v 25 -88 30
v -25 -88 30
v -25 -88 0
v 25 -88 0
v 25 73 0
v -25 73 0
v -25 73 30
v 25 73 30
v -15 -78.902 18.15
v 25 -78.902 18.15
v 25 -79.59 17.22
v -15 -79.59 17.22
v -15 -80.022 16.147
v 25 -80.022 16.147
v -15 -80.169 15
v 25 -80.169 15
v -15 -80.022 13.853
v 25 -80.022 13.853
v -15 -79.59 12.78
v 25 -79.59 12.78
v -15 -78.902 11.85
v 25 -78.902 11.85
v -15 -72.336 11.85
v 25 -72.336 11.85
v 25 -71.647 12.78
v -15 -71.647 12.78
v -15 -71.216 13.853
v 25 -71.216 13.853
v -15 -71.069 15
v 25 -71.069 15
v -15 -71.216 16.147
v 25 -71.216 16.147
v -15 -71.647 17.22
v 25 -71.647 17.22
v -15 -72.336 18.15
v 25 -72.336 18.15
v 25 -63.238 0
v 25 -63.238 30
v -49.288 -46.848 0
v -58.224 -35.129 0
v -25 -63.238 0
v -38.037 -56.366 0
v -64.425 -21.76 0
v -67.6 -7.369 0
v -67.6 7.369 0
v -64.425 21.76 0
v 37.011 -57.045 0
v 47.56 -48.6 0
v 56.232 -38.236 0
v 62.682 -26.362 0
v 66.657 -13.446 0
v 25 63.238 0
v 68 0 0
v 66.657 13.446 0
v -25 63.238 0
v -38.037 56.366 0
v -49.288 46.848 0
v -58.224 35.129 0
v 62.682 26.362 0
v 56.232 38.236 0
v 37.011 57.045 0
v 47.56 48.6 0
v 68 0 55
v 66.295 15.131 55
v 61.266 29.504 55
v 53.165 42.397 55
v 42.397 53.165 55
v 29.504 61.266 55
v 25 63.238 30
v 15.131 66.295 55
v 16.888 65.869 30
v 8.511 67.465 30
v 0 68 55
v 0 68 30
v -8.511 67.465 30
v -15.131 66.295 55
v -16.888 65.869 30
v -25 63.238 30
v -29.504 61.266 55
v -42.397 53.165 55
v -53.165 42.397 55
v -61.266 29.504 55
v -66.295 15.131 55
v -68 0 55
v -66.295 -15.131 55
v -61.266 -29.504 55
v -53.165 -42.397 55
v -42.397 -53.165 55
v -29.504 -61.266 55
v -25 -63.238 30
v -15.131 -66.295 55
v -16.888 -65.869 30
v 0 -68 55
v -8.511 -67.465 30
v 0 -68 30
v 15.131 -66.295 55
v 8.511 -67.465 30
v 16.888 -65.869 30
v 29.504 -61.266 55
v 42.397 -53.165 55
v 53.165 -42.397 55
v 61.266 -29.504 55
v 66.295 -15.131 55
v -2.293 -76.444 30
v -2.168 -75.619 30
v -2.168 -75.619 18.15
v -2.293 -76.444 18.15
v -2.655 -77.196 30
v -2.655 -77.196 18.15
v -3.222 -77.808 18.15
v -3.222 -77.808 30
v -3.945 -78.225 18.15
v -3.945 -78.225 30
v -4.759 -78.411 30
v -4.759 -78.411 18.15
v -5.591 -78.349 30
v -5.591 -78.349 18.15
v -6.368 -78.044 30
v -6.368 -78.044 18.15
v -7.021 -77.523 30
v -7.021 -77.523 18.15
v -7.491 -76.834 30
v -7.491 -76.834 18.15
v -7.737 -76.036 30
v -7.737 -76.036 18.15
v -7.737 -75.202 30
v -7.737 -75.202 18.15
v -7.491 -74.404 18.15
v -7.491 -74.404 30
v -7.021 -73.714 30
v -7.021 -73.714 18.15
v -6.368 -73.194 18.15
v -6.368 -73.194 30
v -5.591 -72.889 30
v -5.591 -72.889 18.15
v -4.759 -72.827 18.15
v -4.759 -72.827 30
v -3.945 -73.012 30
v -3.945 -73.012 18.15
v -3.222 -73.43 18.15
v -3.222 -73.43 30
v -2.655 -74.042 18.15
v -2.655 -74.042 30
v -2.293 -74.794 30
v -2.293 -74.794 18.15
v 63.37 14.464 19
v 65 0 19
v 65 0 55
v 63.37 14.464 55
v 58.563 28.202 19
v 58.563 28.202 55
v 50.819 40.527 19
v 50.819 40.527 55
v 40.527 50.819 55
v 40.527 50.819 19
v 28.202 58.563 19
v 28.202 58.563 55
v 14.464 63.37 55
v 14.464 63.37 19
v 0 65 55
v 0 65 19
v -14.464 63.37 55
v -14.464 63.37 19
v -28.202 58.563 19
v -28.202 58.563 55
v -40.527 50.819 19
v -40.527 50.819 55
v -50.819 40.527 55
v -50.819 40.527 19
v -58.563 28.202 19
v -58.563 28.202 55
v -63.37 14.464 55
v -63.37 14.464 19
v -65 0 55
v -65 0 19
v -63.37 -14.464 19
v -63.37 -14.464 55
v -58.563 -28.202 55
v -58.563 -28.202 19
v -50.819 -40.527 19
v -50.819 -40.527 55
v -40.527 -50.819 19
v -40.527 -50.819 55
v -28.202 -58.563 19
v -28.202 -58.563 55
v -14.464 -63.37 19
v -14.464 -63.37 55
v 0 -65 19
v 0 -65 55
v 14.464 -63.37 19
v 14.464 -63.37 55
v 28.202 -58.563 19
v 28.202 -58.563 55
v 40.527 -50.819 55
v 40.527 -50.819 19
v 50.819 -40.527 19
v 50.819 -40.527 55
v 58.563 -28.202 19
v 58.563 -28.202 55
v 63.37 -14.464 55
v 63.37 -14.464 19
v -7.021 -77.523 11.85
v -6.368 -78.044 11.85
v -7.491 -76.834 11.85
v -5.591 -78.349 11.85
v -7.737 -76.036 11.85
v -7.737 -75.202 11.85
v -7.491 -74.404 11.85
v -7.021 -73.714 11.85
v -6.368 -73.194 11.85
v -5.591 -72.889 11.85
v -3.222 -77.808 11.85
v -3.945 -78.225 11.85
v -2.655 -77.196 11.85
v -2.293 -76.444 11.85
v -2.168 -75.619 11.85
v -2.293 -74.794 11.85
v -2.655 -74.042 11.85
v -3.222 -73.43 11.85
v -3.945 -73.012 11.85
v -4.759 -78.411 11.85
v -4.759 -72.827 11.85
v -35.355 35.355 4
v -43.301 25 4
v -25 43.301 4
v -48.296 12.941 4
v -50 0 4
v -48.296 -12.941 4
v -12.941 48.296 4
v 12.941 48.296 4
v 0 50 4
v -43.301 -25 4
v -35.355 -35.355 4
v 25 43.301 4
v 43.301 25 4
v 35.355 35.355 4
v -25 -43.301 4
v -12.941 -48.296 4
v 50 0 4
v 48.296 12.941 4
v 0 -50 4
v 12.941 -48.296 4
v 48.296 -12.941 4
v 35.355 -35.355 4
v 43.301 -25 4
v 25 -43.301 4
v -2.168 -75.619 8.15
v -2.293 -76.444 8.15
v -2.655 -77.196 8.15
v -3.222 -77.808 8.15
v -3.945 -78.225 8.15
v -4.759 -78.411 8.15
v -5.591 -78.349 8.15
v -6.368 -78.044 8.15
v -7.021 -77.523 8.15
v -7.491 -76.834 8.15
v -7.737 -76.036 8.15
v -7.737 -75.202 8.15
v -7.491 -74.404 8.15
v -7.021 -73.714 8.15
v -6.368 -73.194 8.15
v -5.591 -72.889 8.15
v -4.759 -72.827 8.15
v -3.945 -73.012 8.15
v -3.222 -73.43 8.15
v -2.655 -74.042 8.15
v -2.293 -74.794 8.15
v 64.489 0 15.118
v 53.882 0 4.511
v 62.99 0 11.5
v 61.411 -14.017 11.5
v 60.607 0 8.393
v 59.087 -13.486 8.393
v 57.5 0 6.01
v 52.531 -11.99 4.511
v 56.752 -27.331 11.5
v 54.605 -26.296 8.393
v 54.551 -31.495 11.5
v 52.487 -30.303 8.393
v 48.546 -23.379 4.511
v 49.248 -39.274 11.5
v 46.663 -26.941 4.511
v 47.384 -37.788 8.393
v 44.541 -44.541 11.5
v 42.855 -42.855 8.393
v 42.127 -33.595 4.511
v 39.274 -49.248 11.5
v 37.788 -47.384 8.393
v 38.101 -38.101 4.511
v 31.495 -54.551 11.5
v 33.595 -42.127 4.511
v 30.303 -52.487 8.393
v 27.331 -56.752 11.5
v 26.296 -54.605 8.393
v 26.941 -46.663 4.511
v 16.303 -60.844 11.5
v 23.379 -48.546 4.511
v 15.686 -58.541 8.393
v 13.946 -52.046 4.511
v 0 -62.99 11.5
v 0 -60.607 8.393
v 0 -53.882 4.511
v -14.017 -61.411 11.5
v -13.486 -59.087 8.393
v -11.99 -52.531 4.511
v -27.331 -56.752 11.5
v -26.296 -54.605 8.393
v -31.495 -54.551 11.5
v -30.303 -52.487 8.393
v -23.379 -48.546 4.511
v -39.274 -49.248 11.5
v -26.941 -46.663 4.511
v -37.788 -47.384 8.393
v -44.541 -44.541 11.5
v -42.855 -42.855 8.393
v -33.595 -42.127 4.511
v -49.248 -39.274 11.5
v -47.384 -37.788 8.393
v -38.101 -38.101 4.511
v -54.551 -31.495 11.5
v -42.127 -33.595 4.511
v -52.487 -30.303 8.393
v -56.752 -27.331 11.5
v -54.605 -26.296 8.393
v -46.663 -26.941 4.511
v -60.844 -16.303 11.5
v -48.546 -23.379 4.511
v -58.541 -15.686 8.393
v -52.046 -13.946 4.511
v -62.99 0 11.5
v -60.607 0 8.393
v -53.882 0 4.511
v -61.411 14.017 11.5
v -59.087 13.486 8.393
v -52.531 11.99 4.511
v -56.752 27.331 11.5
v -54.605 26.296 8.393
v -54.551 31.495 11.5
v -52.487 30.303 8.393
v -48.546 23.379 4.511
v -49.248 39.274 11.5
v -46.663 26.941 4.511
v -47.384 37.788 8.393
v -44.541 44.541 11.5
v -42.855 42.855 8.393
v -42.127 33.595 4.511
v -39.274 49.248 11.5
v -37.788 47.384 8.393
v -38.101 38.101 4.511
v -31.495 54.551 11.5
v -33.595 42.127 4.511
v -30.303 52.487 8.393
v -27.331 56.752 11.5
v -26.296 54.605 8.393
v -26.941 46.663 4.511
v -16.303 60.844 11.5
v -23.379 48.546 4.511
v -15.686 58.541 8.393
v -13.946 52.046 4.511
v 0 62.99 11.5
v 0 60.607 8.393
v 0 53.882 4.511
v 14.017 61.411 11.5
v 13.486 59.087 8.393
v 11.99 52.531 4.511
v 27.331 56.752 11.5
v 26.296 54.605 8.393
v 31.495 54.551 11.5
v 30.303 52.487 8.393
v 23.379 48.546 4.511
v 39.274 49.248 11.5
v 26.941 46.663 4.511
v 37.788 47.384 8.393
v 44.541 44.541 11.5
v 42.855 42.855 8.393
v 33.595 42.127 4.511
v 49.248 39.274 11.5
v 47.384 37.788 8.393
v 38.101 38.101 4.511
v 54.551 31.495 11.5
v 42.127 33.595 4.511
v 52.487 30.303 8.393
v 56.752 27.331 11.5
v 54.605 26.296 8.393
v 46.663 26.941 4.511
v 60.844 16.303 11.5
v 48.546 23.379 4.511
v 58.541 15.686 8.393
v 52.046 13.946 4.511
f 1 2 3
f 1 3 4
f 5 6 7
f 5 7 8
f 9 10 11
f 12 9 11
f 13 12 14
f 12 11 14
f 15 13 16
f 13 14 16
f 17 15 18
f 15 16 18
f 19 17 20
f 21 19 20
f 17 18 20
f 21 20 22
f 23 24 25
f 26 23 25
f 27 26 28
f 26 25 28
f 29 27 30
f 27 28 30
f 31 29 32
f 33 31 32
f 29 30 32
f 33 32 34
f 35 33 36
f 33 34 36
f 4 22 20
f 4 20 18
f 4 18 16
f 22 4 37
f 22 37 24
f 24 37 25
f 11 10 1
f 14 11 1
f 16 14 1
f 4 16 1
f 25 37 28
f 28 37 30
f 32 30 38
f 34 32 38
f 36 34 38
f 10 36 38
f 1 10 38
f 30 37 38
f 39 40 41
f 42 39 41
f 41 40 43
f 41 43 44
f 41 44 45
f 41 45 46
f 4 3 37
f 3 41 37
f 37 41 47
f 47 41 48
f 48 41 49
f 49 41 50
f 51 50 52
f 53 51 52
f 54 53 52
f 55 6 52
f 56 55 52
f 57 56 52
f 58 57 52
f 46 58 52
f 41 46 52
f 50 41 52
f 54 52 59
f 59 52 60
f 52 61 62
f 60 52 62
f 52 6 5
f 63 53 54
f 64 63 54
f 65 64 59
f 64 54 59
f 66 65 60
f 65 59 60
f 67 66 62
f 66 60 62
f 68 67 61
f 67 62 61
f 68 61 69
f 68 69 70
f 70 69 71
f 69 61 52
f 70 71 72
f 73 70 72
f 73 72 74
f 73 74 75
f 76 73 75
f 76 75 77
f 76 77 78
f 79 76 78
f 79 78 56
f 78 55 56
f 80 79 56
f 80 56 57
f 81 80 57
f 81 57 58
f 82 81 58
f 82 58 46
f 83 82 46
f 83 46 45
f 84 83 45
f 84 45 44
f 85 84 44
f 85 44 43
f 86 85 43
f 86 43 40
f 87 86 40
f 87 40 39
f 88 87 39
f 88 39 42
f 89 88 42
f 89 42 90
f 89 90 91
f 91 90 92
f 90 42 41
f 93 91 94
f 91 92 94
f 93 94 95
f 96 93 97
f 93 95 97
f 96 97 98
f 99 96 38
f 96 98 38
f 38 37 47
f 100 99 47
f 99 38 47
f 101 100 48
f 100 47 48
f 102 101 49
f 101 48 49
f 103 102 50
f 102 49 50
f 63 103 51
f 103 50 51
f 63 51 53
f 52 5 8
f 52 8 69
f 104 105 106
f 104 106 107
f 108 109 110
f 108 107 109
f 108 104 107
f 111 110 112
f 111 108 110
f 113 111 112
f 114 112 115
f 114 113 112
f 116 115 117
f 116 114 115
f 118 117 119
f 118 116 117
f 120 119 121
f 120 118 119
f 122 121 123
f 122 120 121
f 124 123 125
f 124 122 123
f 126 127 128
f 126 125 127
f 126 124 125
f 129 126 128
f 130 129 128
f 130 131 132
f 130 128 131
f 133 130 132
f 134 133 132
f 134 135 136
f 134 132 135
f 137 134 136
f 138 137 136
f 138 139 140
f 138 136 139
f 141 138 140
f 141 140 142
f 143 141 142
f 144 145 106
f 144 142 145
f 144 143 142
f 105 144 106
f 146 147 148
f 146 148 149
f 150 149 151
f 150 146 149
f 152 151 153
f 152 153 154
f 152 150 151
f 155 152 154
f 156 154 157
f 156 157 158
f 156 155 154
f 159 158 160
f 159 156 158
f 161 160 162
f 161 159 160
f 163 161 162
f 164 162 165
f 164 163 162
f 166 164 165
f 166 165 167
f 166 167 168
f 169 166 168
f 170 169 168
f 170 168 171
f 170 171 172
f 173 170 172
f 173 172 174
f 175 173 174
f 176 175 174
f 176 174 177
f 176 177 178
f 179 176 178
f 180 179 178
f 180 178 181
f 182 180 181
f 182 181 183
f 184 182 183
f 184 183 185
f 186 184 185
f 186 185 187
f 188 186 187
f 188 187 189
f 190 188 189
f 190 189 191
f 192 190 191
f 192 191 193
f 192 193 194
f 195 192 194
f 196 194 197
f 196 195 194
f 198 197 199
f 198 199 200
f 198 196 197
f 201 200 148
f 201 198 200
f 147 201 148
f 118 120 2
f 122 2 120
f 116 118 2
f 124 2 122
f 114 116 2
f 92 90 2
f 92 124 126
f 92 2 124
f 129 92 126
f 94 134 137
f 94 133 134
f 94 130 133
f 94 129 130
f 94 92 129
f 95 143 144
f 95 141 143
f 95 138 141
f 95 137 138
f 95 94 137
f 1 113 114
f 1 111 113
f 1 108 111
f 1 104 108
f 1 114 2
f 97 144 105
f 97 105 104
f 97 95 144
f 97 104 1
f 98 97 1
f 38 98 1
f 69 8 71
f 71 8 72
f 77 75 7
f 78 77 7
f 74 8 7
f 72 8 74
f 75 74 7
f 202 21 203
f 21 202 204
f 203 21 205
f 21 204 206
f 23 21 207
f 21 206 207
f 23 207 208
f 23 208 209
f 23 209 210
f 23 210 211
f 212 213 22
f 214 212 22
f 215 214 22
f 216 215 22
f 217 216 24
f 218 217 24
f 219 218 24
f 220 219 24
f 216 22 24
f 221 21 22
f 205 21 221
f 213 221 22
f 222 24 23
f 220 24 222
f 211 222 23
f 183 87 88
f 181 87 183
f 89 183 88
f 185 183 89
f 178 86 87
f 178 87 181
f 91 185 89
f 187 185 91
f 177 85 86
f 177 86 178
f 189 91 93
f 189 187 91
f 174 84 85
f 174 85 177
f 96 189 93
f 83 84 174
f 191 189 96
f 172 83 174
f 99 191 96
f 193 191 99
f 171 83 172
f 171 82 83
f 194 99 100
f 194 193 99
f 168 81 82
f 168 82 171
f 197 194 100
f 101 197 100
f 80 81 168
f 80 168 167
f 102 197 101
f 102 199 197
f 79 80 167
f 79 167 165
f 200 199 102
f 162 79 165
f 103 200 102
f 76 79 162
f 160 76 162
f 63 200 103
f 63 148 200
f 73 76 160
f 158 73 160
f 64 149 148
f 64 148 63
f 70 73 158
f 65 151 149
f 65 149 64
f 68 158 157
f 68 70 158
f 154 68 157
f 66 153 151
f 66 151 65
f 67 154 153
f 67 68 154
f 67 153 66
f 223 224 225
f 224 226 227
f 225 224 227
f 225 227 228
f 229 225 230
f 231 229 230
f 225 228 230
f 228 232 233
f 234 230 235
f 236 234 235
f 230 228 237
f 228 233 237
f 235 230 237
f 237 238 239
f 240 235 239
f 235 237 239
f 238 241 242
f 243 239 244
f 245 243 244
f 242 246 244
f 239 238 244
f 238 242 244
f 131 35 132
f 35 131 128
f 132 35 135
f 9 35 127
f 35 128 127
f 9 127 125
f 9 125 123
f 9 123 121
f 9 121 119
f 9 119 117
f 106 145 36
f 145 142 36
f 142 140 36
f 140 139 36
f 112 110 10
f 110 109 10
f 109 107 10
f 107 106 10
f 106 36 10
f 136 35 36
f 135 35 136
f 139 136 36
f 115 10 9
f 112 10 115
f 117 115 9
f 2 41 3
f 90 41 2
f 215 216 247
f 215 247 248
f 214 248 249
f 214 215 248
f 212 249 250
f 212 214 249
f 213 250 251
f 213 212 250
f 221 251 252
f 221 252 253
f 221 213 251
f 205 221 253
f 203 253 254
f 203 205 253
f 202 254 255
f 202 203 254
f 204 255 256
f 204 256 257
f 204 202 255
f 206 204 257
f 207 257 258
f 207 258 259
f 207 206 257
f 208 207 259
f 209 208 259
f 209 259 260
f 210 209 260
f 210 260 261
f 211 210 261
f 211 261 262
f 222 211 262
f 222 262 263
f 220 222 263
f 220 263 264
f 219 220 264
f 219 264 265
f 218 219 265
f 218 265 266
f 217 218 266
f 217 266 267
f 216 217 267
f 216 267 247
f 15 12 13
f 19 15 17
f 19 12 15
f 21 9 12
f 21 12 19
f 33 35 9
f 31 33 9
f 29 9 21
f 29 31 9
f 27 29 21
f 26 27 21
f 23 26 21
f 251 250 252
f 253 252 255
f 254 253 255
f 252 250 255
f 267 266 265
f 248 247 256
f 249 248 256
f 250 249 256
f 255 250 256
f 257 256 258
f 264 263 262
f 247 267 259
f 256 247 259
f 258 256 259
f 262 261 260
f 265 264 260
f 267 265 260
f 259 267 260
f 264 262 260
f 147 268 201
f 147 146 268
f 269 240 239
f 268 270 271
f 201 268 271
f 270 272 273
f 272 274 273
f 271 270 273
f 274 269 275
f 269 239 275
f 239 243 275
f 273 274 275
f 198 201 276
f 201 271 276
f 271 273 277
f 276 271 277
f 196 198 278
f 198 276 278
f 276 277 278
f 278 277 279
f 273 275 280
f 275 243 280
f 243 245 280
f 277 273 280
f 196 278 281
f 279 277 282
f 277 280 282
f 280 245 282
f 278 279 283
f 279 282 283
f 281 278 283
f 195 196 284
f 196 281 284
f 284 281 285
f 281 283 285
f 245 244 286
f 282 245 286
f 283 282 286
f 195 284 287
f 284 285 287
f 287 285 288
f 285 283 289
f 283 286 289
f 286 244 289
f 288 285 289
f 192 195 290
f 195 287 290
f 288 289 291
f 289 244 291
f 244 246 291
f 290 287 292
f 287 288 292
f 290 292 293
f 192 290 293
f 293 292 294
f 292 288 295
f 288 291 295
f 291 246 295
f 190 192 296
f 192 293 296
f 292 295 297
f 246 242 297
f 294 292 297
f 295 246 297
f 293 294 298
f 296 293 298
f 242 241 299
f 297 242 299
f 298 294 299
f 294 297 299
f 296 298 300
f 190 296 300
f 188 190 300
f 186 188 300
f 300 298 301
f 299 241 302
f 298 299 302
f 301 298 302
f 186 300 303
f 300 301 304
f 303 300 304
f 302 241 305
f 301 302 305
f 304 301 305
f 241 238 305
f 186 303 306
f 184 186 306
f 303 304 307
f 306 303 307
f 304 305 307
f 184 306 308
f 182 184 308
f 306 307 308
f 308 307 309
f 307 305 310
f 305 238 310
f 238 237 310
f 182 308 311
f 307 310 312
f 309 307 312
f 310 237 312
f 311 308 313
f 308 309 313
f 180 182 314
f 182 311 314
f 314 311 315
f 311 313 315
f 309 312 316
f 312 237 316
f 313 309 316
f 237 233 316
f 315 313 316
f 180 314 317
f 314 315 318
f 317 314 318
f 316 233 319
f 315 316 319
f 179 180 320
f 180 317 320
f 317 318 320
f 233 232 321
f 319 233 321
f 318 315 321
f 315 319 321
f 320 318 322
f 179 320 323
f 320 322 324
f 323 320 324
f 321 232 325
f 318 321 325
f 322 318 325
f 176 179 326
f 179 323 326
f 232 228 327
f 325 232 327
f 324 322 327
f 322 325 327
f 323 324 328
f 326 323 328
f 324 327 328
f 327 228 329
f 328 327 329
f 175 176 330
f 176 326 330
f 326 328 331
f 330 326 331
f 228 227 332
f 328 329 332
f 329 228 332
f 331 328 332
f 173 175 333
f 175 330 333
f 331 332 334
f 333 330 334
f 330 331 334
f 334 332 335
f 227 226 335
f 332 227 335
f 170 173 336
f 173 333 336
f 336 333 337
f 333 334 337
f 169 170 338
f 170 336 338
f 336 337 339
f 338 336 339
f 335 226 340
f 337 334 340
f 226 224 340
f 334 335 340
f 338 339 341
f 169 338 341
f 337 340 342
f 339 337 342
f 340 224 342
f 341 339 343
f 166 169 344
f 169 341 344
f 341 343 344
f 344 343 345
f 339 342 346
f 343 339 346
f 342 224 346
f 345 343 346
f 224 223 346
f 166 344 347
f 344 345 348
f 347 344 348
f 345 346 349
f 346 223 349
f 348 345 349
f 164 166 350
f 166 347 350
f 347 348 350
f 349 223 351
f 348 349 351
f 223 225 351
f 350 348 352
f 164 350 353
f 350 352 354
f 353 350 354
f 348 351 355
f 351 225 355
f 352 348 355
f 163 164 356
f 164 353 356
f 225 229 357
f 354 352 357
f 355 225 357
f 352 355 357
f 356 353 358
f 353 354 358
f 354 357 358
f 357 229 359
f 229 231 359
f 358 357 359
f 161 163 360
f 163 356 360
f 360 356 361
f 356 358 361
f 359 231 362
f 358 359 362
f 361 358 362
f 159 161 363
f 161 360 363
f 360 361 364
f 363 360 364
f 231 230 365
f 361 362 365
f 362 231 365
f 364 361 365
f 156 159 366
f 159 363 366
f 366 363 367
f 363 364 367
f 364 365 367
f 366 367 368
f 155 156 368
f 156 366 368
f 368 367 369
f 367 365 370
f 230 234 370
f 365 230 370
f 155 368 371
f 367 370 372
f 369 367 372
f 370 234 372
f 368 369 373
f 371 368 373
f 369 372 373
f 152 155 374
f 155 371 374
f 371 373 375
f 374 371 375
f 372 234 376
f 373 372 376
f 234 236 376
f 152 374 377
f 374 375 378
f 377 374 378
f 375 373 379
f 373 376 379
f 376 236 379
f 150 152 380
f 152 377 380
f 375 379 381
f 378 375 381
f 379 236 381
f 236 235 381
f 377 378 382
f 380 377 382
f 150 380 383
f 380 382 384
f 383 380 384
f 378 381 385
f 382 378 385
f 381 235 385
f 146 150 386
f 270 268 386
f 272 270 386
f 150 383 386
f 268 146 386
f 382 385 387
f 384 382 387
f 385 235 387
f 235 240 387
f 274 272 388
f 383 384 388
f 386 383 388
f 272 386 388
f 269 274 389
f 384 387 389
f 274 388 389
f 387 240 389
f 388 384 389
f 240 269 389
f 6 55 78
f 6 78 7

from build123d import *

# Parameters (mm, degrees)
SKETCH_1_R               = 68
SKETCH_1_R_2             = 65
EXTRUDE_1_DEPTH          = 55
SKETCH_2_R               = 68
EXTRUDE_1_2_DEPTH        = 4
FILLET_1_R               = 15
EXTRUDE_2_DEPTH          = 30
SKETCH_4_W               = 50
SKETCH_4_H               = 30
EXTRUDE_3_DEPTH          = 15
CUT_EXTRUDE_1_DEPTH      = 40
CUT_EXTRUDE_2_DEPTH      = 10
CUT_EXTRUDE_2_DEPTH_BACK = 20


with BuildPart() as part:
    # 草图1 → Extrude 1 (new body)
    with BuildSketch(Plane.XY):
        Circle(SKETCH_1_R)
        Circle(SKETCH_1_R_2, mode=Mode.SUBTRACT)
    extrude(amount=EXTRUDE_1_DEPTH)

    # 草图2 → Extrude 1 2 (add)
    with BuildSketch(Plane(origin=(0, 0, 0), x_dir=(-1, 0, 0), z_dir=(0, 0, -1))):
        with Locations(Location((0, 0, 0), (0, 0, 180))):
            Circle(SKETCH_2_R)
    extrude(amount=-EXTRUDE_1_2_DEPTH)

    # 圆角1
    fillet_1_edges = [part.edges().sort_by_distance(p)[0] for p in [
        (-65, 0, 4),
    ]]
    fillet(fillet_1_edges, radius=FILLET_1_R)

    # 草图3 → 凸台-拉伸2 (add)
    with BuildSketch(Plane(origin=(0, 0, 0), x_dir=(-1, 0, 0), z_dir=(0, 0, -1))):
        with BuildLine():
            Line((25, -73), (25, -63.237647015))
            ThreePointArc((25, -63.237647015), (12.724779035, -66.798802373), (0, -68))
            ThreePointArc((0, -68), (-12.724779035, -66.798802373), (-25, -63.237647015))
            Line((-25, -63.237647015), (-25, -73))
            Line((-25, -73), (25, -73))
        make_face()
        with BuildLine():
            ThreePointArc((-25, 63.237647015), (-12.724779035, 66.798802373), (0, 68))
            ThreePointArc((0, 68), (12.724779035, 66.798802373), (25, 63.237647015))
            Line((25, 63.237647015), (25, 73))
            Line((25, 73), (-25, 73))
            Line((-25, 73), (-25, 63.237647015))
        make_face()
    extrude(amount=-EXTRUDE_2_DEPTH)

    # 草图4 → 凸台-拉伸3 (add)
    with BuildSketch(Plane.XZ.offset(73)):
        with Locations((0, 15)):
            Rectangle(SKETCH_4_W, SKETCH_4_H)
    extrude(amount=EXTRUDE_3_DEPTH)

    # 草图5 → 切除-拉伸1 (cut)
    with BuildSketch(Plane(origin=(25, 0, 0), x_dir=(0, 0, -1), z_dir=(1, 0, 0))):
        with BuildLine():
            Line((-18.15, -72.335532476), (-18.15, -75.618823508))
            Line((-18.15, -75.618823508), (-11.85, -75.618823508))
            Line((-11.85, -75.618823508), (-11.85, -72.335532476))
            ThreePointArc((-11.85, -72.335532476), (-15, -71.068823508), (-18.15, -72.335532476))
        make_face()
        with BuildLine():
            Line((-11.85, -75.618823508), (-18.15, -75.618823508))
            Line((-18.15, -75.618823508), (-18.15, -78.902114539))
            ThreePointArc((-18.15, -78.902114539), (-15, -80.168823508), (-11.85, -78.902114539))
            Line((-11.85, -78.902114539), (-11.85, -75.618823508))
        make_face()
    extrude(amount=-CUT_EXTRUDE_1_DEPTH, mode=Mode.SUBTRACT)

    # 草图6 → 切除-拉伸2 (cut, two sides: drawn at the far end of the back side and taken through both)
    with BuildSketch(Plane(origin=(0, 0, 18.15), x_dir=(-1, 0, 0), z_dir=(0, 0, -1)).offset(-CUT_EXTRUDE_2_DEPTH_BACK)):
        with BuildLine():
            ThreePointArc((7.768196181, -75.618823508), (4.968196181, -72.818823508), (2.168196181, -75.618823508))
            Line((2.168196181, -75.618823508), (7.768196181, -75.618823508))
        make_face()
        with BuildLine():
            Line((7.768196181, -75.618823508), (2.168196181, -75.618823508))
            ThreePointArc((2.168196181, -75.618823508), (4.968196181, -78.418823508), (7.768196181, -75.618823508))
        make_face()
    extrude(amount=CUT_EXTRUDE_2_DEPTH + CUT_EXTRUDE_2_DEPTH_BACK, mode=Mode.SUBTRACT)


solid = part.part
